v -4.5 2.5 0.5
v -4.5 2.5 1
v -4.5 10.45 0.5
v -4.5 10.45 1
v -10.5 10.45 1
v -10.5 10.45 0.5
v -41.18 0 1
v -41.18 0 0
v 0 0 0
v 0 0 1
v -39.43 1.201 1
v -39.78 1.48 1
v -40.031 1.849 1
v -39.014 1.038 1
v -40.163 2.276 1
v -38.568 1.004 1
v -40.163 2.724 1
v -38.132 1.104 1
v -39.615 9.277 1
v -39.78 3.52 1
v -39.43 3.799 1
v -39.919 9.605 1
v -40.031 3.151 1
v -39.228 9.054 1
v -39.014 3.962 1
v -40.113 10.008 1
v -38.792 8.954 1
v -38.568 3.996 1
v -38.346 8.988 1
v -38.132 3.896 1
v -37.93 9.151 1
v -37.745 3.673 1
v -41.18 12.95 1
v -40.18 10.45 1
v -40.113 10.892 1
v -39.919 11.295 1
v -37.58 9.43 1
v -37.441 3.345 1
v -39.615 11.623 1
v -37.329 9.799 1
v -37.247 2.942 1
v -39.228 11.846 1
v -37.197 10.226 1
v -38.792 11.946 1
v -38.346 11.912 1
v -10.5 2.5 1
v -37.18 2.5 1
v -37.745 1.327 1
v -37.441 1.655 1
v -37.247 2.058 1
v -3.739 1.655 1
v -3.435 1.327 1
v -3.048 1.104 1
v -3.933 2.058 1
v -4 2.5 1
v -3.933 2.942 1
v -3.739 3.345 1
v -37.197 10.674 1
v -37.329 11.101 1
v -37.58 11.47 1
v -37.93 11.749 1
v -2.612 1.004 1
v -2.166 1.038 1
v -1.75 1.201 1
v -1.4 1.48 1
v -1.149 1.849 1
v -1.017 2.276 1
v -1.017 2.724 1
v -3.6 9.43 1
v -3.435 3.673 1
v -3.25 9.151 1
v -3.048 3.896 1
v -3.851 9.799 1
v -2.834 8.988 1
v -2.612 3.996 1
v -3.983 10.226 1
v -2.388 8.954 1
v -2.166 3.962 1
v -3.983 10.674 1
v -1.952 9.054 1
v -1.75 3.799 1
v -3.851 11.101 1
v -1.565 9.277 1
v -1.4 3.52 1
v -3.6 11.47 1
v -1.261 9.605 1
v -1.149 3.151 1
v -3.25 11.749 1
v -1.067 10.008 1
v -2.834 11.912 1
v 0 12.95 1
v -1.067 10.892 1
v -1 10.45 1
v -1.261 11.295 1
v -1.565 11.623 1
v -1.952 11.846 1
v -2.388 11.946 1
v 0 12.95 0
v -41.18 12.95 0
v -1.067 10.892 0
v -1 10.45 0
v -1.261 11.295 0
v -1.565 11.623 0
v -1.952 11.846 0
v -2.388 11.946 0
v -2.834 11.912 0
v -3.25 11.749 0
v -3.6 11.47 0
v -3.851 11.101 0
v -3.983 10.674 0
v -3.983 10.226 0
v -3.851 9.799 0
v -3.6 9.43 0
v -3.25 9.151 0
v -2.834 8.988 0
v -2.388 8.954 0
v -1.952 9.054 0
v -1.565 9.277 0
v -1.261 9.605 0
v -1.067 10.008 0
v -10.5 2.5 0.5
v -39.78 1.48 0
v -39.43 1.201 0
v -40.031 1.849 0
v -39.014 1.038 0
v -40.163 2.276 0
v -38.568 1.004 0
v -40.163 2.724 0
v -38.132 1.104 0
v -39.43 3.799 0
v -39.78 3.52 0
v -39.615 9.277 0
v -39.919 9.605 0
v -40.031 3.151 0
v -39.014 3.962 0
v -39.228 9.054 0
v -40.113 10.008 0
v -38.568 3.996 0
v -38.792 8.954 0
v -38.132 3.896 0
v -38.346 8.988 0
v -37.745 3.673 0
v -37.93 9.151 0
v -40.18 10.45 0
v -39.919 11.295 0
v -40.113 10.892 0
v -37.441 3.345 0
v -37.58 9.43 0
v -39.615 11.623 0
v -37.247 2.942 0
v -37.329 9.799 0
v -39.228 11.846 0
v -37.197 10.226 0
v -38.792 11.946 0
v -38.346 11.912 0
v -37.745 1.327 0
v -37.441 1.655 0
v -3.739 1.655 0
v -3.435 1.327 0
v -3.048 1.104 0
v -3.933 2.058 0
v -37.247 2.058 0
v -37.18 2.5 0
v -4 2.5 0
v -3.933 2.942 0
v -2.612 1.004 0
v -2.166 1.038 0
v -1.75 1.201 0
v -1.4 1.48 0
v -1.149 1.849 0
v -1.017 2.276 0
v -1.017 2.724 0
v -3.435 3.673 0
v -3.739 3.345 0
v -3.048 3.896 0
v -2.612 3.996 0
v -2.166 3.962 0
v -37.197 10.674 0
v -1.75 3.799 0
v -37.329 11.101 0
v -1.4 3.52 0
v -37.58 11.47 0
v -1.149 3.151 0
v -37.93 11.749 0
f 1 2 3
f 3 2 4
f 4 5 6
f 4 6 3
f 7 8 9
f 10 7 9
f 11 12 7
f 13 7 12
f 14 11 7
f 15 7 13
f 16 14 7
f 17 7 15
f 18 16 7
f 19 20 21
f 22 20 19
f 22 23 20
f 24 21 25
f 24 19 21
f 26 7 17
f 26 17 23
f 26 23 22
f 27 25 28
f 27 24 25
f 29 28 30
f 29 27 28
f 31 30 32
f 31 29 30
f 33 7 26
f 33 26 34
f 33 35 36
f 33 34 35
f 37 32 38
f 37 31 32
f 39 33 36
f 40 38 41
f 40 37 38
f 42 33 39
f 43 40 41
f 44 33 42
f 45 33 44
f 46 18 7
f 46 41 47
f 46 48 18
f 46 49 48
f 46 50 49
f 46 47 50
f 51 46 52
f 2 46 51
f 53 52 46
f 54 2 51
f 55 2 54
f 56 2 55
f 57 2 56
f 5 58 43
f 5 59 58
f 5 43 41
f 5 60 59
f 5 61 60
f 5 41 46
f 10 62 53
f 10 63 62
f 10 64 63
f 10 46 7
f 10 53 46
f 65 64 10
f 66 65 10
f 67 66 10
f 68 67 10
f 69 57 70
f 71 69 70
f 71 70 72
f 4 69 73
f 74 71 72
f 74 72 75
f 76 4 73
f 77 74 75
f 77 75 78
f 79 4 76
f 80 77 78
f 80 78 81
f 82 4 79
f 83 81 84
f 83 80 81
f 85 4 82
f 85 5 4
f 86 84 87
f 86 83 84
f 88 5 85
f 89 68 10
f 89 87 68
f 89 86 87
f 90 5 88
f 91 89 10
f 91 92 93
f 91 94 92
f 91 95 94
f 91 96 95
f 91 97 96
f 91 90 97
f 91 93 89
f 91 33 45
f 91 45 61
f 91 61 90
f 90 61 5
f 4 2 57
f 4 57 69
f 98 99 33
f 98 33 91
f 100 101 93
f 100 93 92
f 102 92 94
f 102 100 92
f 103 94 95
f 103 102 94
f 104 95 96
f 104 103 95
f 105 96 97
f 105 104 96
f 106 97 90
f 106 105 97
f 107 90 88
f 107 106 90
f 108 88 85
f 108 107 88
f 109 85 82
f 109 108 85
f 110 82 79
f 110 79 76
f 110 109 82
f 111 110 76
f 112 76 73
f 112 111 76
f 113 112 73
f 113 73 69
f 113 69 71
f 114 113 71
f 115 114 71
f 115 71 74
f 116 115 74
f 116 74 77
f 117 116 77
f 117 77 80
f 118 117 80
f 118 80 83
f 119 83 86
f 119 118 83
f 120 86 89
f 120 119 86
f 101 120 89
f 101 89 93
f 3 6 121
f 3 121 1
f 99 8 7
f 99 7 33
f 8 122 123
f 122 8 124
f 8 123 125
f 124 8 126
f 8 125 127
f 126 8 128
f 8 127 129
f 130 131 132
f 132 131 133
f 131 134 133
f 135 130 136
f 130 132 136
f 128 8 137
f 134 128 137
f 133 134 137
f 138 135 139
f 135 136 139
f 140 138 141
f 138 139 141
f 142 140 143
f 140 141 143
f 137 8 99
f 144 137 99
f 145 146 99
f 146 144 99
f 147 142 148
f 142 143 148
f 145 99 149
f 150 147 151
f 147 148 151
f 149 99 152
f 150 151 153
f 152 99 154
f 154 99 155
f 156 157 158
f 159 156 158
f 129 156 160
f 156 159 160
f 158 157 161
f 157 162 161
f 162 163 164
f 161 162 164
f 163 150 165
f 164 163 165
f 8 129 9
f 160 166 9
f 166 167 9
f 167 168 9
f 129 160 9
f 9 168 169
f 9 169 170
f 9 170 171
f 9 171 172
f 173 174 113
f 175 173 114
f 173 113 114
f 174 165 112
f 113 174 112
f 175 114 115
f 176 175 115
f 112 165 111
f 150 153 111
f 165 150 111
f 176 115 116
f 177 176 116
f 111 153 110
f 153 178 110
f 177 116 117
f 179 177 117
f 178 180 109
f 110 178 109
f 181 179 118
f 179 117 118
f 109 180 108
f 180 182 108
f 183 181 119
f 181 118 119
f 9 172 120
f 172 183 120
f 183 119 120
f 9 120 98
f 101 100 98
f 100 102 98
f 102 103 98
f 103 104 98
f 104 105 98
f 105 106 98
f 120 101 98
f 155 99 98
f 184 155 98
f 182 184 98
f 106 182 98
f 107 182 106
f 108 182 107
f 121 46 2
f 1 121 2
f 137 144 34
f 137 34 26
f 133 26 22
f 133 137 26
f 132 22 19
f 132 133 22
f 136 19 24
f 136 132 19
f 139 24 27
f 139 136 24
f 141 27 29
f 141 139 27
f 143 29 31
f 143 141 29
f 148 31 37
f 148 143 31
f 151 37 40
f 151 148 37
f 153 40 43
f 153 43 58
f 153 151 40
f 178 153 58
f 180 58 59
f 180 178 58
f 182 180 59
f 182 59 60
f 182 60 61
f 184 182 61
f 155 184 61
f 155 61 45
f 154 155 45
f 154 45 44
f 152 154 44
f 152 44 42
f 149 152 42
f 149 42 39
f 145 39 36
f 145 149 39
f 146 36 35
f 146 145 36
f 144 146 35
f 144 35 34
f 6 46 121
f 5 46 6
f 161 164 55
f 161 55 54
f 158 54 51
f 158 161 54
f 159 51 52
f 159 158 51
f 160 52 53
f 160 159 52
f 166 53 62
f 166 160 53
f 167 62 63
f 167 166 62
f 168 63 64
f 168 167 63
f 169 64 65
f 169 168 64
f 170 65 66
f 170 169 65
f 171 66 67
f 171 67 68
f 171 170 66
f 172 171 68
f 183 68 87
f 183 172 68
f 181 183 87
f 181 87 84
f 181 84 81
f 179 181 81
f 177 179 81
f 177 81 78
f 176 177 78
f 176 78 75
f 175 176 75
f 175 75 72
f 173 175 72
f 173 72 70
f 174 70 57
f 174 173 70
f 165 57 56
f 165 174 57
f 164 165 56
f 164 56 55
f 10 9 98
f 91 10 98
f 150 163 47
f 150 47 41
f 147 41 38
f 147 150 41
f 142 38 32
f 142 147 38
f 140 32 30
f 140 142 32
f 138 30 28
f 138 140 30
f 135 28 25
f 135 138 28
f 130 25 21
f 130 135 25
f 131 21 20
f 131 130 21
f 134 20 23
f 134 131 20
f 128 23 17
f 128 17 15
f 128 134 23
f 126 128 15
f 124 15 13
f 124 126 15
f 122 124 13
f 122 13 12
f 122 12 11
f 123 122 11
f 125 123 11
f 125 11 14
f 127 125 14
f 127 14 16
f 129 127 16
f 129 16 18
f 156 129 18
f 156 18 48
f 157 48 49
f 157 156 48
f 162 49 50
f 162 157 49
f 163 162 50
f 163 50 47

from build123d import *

# Parameters (mm, degrees)
CROQUIS1_W              = 41.18
CROQUIS1_H              = 12.95
CROQUIS1_R              = 1.5
SALIENTE_EXTRUIR1_DEPTH = 1
CROQUIS2_W              = 6
CROQUIS2_H              = 7.95
CORTAR_EXTRUIR1_DEPTH   = 0.5


with BuildPart() as part:
    # Croquis1 → Saliente-Extruir1 (new body)
    with BuildSketch(Plane.XY):
        with Locations((-20.59, 6.475)):
            Rectangle(CROQUIS1_W, CROQUIS1_H)
        with Locations((-38.68, 2.5)):
            Circle(CROQUIS1_R, mode=Mode.SUBTRACT)
        with Locations(Location((-38.68, 10.45, 0), (0, 0, 180))):
            Circle(CROQUIS1_R, mode=Mode.SUBTRACT)
        with Locations(Location((-2.5, 2.5, 0), (0, 0, 180))):
            Circle(CROQUIS1_R, mode=Mode.SUBTRACT)
        with Locations((-2.5, 10.45)):
            Circle(CROQUIS1_R, mode=Mode.SUBTRACT)
    extrude(amount=SALIENTE_EXTRUIR1_DEPTH)

    # Croquis2 → Cortar-Extruir1 (cut)
    with BuildSketch(Plane.XY.offset(1)):
        with Locations((-7.5, 6.475)):
            Rectangle(CROQUIS2_W, CROQUIS2_H)
    extrude(amount=-CORTAR_EXTRUIR1_DEPTH, mode=Mode.SUBTRACT)


solid = part.part
